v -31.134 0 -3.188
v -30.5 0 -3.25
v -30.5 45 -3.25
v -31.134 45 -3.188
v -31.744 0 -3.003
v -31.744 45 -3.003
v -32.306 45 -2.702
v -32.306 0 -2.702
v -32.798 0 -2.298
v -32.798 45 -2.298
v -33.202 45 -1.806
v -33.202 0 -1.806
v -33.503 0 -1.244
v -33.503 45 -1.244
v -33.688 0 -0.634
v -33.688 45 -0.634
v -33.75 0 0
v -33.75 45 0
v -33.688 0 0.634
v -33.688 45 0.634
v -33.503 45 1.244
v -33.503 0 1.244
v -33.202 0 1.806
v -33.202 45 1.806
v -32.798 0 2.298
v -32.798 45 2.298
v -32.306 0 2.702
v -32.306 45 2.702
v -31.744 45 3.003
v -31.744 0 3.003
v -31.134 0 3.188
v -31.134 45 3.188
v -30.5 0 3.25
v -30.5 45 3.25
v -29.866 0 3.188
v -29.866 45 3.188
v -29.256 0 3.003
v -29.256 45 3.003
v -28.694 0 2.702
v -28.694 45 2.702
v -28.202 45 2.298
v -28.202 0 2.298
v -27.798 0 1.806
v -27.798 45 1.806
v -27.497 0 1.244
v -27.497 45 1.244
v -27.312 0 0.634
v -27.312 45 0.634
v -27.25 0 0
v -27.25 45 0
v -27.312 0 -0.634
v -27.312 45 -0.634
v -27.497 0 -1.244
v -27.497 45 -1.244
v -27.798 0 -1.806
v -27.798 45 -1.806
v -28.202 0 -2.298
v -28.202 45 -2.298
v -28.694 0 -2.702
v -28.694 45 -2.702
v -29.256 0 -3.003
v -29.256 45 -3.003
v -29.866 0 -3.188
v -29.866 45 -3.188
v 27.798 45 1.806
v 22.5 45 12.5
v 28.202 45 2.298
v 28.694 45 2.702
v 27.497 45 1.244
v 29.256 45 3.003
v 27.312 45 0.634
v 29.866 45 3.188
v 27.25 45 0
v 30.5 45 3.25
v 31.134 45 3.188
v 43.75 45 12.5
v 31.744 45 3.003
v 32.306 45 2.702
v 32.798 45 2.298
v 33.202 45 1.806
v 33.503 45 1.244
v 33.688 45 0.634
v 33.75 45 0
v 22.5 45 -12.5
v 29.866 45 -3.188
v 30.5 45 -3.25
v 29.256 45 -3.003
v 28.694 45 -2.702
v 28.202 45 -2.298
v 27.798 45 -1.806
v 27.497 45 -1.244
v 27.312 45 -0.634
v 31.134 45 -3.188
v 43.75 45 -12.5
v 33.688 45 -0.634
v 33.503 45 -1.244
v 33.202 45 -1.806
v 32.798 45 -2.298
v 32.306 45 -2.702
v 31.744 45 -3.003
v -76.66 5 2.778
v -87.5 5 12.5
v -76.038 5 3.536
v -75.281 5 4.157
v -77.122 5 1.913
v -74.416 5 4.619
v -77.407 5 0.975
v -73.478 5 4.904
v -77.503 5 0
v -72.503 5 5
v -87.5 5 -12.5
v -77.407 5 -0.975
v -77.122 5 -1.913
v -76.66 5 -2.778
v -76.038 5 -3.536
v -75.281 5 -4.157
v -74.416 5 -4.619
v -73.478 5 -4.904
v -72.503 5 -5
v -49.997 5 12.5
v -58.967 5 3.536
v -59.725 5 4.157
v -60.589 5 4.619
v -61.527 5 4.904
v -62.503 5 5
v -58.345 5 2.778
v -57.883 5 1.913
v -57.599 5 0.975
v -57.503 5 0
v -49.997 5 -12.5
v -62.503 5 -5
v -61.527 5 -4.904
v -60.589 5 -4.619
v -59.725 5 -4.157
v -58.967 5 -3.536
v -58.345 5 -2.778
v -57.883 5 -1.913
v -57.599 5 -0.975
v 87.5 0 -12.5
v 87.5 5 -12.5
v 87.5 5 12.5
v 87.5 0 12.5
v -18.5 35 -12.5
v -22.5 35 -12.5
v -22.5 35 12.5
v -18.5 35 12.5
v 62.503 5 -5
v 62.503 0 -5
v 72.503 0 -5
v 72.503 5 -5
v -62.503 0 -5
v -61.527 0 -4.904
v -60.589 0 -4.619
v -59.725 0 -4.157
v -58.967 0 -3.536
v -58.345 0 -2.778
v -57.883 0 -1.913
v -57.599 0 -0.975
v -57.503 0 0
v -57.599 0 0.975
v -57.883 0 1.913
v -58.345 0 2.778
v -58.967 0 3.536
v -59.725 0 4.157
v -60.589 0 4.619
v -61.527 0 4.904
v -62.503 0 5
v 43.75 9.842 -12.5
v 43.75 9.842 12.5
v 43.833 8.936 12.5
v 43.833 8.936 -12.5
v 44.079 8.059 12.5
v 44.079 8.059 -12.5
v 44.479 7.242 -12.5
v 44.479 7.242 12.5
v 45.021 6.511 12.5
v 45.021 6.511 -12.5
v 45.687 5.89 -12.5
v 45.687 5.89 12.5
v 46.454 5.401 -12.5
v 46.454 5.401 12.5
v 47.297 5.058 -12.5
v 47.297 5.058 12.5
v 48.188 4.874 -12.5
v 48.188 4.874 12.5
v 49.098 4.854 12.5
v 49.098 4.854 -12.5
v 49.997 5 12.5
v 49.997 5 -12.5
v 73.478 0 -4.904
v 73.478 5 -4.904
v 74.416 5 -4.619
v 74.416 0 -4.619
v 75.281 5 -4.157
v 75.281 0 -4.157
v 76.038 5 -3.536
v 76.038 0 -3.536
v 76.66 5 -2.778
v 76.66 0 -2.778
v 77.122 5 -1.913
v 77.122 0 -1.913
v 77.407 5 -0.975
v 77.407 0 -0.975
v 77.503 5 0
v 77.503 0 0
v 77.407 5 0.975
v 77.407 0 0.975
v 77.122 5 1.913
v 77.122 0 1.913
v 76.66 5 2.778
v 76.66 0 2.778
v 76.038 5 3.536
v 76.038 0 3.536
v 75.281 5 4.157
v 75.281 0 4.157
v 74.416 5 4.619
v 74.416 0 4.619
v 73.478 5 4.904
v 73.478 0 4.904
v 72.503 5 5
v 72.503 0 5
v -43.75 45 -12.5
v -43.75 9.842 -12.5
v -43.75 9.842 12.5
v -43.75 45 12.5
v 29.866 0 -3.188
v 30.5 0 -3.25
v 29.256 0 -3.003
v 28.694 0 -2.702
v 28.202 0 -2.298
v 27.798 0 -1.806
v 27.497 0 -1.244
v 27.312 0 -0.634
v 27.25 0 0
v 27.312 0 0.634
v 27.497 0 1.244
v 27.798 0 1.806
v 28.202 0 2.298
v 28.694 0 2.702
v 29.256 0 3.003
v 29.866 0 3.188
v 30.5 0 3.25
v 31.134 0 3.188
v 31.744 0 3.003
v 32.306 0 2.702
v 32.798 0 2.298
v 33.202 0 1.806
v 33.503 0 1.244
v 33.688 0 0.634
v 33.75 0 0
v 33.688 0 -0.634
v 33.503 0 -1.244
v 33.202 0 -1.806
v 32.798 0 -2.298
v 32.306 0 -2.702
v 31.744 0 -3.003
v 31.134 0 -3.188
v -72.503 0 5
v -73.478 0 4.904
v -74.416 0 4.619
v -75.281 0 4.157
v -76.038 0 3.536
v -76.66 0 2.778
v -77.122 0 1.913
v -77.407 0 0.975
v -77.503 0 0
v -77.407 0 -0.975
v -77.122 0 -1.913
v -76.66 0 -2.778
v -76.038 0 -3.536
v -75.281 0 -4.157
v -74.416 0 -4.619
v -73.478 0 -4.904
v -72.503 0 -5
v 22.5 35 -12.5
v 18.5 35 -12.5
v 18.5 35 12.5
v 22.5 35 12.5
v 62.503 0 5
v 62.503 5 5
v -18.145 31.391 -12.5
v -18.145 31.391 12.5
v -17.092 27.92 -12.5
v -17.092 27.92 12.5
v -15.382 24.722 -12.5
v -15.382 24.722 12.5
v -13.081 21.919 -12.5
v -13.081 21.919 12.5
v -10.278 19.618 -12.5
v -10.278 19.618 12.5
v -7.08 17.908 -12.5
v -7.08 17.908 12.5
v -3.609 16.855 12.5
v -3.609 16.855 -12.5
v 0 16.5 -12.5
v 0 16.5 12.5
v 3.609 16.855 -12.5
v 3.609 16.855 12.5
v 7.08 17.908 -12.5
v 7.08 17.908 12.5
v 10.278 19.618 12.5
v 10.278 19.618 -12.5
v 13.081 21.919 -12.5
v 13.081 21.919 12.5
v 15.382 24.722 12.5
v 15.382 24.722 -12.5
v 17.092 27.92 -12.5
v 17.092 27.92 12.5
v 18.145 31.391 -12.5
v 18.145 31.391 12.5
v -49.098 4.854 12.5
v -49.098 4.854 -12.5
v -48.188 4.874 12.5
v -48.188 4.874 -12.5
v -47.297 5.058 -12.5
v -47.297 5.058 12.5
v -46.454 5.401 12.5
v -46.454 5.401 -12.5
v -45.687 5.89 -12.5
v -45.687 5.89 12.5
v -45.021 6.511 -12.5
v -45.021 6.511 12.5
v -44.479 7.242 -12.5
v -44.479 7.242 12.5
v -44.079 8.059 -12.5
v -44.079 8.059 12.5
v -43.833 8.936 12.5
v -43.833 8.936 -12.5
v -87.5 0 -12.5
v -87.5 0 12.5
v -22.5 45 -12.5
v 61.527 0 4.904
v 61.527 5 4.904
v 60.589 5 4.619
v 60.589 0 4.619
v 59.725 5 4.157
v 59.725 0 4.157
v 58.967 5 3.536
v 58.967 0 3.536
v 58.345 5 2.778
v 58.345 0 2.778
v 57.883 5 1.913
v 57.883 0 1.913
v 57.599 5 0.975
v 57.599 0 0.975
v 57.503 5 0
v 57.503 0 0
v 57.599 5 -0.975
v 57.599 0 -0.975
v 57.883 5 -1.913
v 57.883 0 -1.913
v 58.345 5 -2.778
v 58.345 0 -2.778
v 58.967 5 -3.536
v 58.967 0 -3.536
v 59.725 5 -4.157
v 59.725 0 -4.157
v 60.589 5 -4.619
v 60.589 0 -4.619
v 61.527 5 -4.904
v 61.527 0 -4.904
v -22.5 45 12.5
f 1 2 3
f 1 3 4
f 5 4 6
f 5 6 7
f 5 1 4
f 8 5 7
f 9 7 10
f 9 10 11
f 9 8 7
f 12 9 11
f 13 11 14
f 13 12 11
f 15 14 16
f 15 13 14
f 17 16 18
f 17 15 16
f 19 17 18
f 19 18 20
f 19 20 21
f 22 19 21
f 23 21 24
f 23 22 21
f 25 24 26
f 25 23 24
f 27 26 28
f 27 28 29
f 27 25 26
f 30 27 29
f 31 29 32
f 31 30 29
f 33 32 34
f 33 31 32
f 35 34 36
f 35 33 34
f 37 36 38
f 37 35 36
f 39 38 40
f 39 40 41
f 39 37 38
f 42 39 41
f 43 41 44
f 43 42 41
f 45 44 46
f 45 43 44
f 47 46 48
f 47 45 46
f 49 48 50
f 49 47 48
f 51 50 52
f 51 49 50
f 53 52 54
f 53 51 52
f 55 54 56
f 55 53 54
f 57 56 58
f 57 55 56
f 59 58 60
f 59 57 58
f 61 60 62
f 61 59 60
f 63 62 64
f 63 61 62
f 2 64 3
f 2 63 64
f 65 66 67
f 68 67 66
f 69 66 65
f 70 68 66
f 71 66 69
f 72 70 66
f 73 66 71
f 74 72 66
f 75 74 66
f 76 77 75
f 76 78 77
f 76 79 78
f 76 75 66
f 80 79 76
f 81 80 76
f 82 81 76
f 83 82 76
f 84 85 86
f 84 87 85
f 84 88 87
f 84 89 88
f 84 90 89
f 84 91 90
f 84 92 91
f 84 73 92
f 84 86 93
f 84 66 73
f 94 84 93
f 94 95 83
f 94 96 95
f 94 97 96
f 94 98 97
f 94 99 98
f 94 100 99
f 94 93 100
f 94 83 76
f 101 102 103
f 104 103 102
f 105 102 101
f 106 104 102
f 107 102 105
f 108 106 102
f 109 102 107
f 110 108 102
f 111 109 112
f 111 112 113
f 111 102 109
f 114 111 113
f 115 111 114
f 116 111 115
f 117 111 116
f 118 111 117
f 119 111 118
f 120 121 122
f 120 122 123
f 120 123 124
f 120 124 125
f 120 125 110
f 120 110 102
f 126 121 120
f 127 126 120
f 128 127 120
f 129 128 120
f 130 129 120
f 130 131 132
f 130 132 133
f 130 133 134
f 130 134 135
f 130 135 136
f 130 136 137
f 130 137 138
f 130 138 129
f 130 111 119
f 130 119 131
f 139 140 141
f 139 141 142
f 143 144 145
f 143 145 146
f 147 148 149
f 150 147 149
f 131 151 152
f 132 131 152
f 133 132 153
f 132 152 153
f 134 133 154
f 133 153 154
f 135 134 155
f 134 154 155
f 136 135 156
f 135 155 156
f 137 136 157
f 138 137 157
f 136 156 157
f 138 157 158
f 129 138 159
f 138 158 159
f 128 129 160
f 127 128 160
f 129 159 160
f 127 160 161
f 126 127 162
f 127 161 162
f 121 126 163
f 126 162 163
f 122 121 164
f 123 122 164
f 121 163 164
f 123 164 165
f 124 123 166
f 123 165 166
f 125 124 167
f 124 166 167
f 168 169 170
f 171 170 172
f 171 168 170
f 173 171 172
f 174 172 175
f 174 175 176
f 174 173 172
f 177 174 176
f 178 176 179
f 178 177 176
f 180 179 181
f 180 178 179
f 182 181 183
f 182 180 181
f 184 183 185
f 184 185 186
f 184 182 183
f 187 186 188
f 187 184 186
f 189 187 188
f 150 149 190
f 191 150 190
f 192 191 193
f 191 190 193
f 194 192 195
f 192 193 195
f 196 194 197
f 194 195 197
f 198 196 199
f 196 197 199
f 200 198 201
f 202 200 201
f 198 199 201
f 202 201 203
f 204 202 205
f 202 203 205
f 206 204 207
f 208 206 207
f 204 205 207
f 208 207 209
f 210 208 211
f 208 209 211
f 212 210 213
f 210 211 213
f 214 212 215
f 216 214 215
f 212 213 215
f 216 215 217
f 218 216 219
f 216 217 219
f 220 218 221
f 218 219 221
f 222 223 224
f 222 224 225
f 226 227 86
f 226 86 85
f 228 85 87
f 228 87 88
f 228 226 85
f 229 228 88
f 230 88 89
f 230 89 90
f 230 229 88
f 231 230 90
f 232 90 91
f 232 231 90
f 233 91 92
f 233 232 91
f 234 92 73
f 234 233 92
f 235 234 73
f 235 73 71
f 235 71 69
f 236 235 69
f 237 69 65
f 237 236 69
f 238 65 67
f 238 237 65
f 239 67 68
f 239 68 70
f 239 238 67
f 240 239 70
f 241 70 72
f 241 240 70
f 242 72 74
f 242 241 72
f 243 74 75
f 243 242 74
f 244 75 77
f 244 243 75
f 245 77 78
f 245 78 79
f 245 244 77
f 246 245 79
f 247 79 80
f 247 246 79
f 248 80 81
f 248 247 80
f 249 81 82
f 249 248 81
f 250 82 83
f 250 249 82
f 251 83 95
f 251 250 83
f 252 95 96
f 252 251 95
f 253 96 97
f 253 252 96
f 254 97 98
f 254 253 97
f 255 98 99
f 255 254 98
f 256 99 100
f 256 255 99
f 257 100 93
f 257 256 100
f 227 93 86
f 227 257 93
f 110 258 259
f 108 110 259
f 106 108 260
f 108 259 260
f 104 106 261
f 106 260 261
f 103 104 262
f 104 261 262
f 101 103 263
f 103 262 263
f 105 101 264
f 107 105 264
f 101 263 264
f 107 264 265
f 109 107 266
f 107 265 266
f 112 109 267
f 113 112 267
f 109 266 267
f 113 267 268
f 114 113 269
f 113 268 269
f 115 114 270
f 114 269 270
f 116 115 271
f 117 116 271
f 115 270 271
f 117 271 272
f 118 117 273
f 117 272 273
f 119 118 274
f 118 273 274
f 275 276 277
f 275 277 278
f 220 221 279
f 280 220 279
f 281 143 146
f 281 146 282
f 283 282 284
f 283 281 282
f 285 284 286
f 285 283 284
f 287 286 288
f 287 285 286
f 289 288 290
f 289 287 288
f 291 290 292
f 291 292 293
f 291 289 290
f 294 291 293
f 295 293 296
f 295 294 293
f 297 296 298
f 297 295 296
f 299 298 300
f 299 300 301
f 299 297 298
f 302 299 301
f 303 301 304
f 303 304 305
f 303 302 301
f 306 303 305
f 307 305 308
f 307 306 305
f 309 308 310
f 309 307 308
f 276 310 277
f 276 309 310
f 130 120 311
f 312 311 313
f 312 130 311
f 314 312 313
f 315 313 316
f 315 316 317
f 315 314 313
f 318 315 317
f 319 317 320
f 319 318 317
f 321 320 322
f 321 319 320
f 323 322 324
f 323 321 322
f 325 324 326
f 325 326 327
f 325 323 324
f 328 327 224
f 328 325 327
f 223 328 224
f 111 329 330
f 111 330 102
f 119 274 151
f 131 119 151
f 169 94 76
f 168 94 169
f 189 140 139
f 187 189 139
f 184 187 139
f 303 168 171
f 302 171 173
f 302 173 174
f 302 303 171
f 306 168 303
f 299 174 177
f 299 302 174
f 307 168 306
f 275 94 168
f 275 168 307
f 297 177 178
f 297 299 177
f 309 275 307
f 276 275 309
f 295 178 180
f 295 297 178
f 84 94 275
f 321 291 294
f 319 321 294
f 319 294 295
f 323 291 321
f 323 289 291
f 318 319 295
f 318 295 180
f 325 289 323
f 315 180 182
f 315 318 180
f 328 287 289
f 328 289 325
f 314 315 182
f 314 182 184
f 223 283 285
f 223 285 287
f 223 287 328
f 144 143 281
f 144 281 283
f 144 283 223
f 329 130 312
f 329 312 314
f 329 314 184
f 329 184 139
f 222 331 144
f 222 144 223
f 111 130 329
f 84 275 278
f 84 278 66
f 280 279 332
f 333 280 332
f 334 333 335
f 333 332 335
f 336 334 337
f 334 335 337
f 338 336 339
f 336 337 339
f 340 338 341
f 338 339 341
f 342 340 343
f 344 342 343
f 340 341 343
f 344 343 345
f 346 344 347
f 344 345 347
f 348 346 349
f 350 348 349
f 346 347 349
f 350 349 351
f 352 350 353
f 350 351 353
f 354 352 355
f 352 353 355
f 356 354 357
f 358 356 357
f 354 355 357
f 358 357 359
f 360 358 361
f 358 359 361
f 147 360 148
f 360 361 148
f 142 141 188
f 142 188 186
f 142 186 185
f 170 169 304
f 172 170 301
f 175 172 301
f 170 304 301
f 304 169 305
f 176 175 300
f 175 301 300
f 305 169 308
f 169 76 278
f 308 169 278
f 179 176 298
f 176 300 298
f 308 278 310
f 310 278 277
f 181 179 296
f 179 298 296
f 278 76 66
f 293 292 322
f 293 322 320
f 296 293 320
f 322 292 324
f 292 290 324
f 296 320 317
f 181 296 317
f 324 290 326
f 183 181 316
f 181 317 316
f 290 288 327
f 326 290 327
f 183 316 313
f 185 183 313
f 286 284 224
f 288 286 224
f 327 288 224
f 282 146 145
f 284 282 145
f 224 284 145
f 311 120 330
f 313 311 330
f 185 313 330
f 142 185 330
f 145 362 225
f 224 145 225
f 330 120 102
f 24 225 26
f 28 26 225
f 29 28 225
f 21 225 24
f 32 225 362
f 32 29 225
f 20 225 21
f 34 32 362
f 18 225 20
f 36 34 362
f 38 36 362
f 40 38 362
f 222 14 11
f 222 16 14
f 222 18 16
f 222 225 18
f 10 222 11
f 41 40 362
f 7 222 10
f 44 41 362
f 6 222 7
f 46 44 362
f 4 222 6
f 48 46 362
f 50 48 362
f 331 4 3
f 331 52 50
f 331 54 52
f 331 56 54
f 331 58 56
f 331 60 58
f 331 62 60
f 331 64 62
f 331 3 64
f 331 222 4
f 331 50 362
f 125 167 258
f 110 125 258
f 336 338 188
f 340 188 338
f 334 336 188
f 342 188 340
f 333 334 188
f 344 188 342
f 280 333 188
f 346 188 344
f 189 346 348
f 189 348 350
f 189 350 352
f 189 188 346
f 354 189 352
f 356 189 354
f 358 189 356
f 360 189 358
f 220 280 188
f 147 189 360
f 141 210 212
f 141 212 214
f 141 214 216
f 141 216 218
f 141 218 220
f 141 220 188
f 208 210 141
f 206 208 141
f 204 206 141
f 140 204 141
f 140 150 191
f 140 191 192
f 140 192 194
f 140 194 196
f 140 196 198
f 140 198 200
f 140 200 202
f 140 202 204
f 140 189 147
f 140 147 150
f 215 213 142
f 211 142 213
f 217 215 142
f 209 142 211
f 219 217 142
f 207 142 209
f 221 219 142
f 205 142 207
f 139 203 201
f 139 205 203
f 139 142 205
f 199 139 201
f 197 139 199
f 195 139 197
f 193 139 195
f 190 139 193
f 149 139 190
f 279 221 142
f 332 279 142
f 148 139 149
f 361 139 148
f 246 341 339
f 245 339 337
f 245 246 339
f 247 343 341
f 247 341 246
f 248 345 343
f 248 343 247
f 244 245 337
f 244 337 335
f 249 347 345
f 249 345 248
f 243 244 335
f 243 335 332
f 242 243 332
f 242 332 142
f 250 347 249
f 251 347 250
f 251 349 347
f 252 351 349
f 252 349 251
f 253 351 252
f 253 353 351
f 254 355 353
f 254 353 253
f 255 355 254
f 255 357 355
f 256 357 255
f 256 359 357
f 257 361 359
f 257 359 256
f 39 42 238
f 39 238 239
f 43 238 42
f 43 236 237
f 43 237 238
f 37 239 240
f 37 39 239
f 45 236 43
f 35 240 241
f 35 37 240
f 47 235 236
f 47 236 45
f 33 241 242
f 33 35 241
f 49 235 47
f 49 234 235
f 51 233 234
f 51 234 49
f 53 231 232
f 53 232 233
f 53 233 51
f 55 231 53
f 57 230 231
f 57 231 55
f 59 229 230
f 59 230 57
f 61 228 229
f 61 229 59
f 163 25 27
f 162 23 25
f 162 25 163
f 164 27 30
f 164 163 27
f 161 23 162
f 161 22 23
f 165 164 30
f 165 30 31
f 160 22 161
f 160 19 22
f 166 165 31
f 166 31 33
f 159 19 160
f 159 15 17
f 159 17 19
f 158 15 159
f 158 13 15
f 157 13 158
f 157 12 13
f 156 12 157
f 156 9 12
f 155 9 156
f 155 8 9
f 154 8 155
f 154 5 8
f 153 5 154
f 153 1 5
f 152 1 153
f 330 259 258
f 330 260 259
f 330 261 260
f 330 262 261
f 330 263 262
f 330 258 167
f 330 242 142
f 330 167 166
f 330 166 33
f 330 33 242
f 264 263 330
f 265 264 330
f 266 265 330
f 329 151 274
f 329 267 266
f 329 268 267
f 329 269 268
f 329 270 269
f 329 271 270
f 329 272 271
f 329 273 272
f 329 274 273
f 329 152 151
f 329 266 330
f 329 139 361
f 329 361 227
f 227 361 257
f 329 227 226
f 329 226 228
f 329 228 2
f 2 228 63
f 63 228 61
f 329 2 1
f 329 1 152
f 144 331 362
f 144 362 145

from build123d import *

# Parameters (mm, degrees)
BOSS_EXTRUDE2_DEPTH      = 12.5
BOSS_EXTRUDE2_DEPTH_BACK = 12.5
SKETCH2_R                = 3.25
CUT_EXTRUDE3_DEPTH       = 45


with BuildPart() as part:
    # Sketch1 → Boss-Extrude2 (new, two sides: drawn at the far end of the back side and taken through both)
    with BuildSketch(Plane.XY.offset(-BOSS_EXTRUDE2_DEPTH_BACK)):
        with BuildLine():
            Line((87.5, 0), (-87.5, 0))
            Line((-87.5, 0), (-87.5, 5))
            Line((-87.5, 5), (-49.996574748, 5))
            ThreePointArc((-49.996574748, 5), (-45.686739788, 5.89034852), (-43.75, 9.842112287))
            Line((-43.75, 9.842112287), (-43.75, 45))
            Line((-43.75, 45), (-22.5, 45))
            Line((-22.5, 45), (-22.5, 35))
            Line((-22.5, 35), (-18.5, 35))
            ThreePointArc((-18.5, 35), (0, 16.5), (18.5, 35))
            Line((18.5, 35), (22.5, 35))
            Line((22.5, 35), (22.5, 45))
            Line((22.5, 45), (43.75, 45))
            Line((43.75, 45), (43.75, 9.842112287))
            ThreePointArc((43.75, 9.842112287), (45.686739788, 5.89034852), (49.996574748, 5))
            Line((49.996574748, 5), (87.5, 5))
            Line((87.5, 5), (87.5, 0))
        make_face()
    extrude(amount=BOSS_EXTRUDE2_DEPTH + BOSS_EXTRUDE2_DEPTH_BACK)

    # Sketch2 → Cut-Extrude3 (cut)
    with BuildSketch(Plane(origin=(0, 0, 0), x_dir=(1, 0, 0), z_dir=(0, 1, 0))):
        with Locations((-30.5, 0)):
            Circle(SKETCH2_R)
        with Locations((30.5, 0)):
            Circle(SKETCH2_R)
        with BuildLine():
            Line((-72.502650664, 5), (-62.502650664, 5))
            ThreePointArc((-62.502650664, 5), (-57.502650664, 0), (-62.502650664, -5))
            Line((-62.502650664, -5), (-72.502650664, -5))
            ThreePointArc((-72.502650664, -5), (-77.502650664, 0), (-72.502650664, 5))
        make_face()
        with BuildLine():
            Line((72.502650664, -5), (62.502650664, -5))
            ThreePointArc((62.502650664, -5), (57.502650664, 0), (62.502650664, 5))
            Line((62.502650664, 5), (72.502650664, 5))
            ThreePointArc((72.502650664, 5), (77.502650664, 0), (72.502650664, -5))
        make_face()
    extrude(amount=CUT_EXTRUDE3_DEPTH, mode=Mode.SUBTRACT)


solid = part.part
